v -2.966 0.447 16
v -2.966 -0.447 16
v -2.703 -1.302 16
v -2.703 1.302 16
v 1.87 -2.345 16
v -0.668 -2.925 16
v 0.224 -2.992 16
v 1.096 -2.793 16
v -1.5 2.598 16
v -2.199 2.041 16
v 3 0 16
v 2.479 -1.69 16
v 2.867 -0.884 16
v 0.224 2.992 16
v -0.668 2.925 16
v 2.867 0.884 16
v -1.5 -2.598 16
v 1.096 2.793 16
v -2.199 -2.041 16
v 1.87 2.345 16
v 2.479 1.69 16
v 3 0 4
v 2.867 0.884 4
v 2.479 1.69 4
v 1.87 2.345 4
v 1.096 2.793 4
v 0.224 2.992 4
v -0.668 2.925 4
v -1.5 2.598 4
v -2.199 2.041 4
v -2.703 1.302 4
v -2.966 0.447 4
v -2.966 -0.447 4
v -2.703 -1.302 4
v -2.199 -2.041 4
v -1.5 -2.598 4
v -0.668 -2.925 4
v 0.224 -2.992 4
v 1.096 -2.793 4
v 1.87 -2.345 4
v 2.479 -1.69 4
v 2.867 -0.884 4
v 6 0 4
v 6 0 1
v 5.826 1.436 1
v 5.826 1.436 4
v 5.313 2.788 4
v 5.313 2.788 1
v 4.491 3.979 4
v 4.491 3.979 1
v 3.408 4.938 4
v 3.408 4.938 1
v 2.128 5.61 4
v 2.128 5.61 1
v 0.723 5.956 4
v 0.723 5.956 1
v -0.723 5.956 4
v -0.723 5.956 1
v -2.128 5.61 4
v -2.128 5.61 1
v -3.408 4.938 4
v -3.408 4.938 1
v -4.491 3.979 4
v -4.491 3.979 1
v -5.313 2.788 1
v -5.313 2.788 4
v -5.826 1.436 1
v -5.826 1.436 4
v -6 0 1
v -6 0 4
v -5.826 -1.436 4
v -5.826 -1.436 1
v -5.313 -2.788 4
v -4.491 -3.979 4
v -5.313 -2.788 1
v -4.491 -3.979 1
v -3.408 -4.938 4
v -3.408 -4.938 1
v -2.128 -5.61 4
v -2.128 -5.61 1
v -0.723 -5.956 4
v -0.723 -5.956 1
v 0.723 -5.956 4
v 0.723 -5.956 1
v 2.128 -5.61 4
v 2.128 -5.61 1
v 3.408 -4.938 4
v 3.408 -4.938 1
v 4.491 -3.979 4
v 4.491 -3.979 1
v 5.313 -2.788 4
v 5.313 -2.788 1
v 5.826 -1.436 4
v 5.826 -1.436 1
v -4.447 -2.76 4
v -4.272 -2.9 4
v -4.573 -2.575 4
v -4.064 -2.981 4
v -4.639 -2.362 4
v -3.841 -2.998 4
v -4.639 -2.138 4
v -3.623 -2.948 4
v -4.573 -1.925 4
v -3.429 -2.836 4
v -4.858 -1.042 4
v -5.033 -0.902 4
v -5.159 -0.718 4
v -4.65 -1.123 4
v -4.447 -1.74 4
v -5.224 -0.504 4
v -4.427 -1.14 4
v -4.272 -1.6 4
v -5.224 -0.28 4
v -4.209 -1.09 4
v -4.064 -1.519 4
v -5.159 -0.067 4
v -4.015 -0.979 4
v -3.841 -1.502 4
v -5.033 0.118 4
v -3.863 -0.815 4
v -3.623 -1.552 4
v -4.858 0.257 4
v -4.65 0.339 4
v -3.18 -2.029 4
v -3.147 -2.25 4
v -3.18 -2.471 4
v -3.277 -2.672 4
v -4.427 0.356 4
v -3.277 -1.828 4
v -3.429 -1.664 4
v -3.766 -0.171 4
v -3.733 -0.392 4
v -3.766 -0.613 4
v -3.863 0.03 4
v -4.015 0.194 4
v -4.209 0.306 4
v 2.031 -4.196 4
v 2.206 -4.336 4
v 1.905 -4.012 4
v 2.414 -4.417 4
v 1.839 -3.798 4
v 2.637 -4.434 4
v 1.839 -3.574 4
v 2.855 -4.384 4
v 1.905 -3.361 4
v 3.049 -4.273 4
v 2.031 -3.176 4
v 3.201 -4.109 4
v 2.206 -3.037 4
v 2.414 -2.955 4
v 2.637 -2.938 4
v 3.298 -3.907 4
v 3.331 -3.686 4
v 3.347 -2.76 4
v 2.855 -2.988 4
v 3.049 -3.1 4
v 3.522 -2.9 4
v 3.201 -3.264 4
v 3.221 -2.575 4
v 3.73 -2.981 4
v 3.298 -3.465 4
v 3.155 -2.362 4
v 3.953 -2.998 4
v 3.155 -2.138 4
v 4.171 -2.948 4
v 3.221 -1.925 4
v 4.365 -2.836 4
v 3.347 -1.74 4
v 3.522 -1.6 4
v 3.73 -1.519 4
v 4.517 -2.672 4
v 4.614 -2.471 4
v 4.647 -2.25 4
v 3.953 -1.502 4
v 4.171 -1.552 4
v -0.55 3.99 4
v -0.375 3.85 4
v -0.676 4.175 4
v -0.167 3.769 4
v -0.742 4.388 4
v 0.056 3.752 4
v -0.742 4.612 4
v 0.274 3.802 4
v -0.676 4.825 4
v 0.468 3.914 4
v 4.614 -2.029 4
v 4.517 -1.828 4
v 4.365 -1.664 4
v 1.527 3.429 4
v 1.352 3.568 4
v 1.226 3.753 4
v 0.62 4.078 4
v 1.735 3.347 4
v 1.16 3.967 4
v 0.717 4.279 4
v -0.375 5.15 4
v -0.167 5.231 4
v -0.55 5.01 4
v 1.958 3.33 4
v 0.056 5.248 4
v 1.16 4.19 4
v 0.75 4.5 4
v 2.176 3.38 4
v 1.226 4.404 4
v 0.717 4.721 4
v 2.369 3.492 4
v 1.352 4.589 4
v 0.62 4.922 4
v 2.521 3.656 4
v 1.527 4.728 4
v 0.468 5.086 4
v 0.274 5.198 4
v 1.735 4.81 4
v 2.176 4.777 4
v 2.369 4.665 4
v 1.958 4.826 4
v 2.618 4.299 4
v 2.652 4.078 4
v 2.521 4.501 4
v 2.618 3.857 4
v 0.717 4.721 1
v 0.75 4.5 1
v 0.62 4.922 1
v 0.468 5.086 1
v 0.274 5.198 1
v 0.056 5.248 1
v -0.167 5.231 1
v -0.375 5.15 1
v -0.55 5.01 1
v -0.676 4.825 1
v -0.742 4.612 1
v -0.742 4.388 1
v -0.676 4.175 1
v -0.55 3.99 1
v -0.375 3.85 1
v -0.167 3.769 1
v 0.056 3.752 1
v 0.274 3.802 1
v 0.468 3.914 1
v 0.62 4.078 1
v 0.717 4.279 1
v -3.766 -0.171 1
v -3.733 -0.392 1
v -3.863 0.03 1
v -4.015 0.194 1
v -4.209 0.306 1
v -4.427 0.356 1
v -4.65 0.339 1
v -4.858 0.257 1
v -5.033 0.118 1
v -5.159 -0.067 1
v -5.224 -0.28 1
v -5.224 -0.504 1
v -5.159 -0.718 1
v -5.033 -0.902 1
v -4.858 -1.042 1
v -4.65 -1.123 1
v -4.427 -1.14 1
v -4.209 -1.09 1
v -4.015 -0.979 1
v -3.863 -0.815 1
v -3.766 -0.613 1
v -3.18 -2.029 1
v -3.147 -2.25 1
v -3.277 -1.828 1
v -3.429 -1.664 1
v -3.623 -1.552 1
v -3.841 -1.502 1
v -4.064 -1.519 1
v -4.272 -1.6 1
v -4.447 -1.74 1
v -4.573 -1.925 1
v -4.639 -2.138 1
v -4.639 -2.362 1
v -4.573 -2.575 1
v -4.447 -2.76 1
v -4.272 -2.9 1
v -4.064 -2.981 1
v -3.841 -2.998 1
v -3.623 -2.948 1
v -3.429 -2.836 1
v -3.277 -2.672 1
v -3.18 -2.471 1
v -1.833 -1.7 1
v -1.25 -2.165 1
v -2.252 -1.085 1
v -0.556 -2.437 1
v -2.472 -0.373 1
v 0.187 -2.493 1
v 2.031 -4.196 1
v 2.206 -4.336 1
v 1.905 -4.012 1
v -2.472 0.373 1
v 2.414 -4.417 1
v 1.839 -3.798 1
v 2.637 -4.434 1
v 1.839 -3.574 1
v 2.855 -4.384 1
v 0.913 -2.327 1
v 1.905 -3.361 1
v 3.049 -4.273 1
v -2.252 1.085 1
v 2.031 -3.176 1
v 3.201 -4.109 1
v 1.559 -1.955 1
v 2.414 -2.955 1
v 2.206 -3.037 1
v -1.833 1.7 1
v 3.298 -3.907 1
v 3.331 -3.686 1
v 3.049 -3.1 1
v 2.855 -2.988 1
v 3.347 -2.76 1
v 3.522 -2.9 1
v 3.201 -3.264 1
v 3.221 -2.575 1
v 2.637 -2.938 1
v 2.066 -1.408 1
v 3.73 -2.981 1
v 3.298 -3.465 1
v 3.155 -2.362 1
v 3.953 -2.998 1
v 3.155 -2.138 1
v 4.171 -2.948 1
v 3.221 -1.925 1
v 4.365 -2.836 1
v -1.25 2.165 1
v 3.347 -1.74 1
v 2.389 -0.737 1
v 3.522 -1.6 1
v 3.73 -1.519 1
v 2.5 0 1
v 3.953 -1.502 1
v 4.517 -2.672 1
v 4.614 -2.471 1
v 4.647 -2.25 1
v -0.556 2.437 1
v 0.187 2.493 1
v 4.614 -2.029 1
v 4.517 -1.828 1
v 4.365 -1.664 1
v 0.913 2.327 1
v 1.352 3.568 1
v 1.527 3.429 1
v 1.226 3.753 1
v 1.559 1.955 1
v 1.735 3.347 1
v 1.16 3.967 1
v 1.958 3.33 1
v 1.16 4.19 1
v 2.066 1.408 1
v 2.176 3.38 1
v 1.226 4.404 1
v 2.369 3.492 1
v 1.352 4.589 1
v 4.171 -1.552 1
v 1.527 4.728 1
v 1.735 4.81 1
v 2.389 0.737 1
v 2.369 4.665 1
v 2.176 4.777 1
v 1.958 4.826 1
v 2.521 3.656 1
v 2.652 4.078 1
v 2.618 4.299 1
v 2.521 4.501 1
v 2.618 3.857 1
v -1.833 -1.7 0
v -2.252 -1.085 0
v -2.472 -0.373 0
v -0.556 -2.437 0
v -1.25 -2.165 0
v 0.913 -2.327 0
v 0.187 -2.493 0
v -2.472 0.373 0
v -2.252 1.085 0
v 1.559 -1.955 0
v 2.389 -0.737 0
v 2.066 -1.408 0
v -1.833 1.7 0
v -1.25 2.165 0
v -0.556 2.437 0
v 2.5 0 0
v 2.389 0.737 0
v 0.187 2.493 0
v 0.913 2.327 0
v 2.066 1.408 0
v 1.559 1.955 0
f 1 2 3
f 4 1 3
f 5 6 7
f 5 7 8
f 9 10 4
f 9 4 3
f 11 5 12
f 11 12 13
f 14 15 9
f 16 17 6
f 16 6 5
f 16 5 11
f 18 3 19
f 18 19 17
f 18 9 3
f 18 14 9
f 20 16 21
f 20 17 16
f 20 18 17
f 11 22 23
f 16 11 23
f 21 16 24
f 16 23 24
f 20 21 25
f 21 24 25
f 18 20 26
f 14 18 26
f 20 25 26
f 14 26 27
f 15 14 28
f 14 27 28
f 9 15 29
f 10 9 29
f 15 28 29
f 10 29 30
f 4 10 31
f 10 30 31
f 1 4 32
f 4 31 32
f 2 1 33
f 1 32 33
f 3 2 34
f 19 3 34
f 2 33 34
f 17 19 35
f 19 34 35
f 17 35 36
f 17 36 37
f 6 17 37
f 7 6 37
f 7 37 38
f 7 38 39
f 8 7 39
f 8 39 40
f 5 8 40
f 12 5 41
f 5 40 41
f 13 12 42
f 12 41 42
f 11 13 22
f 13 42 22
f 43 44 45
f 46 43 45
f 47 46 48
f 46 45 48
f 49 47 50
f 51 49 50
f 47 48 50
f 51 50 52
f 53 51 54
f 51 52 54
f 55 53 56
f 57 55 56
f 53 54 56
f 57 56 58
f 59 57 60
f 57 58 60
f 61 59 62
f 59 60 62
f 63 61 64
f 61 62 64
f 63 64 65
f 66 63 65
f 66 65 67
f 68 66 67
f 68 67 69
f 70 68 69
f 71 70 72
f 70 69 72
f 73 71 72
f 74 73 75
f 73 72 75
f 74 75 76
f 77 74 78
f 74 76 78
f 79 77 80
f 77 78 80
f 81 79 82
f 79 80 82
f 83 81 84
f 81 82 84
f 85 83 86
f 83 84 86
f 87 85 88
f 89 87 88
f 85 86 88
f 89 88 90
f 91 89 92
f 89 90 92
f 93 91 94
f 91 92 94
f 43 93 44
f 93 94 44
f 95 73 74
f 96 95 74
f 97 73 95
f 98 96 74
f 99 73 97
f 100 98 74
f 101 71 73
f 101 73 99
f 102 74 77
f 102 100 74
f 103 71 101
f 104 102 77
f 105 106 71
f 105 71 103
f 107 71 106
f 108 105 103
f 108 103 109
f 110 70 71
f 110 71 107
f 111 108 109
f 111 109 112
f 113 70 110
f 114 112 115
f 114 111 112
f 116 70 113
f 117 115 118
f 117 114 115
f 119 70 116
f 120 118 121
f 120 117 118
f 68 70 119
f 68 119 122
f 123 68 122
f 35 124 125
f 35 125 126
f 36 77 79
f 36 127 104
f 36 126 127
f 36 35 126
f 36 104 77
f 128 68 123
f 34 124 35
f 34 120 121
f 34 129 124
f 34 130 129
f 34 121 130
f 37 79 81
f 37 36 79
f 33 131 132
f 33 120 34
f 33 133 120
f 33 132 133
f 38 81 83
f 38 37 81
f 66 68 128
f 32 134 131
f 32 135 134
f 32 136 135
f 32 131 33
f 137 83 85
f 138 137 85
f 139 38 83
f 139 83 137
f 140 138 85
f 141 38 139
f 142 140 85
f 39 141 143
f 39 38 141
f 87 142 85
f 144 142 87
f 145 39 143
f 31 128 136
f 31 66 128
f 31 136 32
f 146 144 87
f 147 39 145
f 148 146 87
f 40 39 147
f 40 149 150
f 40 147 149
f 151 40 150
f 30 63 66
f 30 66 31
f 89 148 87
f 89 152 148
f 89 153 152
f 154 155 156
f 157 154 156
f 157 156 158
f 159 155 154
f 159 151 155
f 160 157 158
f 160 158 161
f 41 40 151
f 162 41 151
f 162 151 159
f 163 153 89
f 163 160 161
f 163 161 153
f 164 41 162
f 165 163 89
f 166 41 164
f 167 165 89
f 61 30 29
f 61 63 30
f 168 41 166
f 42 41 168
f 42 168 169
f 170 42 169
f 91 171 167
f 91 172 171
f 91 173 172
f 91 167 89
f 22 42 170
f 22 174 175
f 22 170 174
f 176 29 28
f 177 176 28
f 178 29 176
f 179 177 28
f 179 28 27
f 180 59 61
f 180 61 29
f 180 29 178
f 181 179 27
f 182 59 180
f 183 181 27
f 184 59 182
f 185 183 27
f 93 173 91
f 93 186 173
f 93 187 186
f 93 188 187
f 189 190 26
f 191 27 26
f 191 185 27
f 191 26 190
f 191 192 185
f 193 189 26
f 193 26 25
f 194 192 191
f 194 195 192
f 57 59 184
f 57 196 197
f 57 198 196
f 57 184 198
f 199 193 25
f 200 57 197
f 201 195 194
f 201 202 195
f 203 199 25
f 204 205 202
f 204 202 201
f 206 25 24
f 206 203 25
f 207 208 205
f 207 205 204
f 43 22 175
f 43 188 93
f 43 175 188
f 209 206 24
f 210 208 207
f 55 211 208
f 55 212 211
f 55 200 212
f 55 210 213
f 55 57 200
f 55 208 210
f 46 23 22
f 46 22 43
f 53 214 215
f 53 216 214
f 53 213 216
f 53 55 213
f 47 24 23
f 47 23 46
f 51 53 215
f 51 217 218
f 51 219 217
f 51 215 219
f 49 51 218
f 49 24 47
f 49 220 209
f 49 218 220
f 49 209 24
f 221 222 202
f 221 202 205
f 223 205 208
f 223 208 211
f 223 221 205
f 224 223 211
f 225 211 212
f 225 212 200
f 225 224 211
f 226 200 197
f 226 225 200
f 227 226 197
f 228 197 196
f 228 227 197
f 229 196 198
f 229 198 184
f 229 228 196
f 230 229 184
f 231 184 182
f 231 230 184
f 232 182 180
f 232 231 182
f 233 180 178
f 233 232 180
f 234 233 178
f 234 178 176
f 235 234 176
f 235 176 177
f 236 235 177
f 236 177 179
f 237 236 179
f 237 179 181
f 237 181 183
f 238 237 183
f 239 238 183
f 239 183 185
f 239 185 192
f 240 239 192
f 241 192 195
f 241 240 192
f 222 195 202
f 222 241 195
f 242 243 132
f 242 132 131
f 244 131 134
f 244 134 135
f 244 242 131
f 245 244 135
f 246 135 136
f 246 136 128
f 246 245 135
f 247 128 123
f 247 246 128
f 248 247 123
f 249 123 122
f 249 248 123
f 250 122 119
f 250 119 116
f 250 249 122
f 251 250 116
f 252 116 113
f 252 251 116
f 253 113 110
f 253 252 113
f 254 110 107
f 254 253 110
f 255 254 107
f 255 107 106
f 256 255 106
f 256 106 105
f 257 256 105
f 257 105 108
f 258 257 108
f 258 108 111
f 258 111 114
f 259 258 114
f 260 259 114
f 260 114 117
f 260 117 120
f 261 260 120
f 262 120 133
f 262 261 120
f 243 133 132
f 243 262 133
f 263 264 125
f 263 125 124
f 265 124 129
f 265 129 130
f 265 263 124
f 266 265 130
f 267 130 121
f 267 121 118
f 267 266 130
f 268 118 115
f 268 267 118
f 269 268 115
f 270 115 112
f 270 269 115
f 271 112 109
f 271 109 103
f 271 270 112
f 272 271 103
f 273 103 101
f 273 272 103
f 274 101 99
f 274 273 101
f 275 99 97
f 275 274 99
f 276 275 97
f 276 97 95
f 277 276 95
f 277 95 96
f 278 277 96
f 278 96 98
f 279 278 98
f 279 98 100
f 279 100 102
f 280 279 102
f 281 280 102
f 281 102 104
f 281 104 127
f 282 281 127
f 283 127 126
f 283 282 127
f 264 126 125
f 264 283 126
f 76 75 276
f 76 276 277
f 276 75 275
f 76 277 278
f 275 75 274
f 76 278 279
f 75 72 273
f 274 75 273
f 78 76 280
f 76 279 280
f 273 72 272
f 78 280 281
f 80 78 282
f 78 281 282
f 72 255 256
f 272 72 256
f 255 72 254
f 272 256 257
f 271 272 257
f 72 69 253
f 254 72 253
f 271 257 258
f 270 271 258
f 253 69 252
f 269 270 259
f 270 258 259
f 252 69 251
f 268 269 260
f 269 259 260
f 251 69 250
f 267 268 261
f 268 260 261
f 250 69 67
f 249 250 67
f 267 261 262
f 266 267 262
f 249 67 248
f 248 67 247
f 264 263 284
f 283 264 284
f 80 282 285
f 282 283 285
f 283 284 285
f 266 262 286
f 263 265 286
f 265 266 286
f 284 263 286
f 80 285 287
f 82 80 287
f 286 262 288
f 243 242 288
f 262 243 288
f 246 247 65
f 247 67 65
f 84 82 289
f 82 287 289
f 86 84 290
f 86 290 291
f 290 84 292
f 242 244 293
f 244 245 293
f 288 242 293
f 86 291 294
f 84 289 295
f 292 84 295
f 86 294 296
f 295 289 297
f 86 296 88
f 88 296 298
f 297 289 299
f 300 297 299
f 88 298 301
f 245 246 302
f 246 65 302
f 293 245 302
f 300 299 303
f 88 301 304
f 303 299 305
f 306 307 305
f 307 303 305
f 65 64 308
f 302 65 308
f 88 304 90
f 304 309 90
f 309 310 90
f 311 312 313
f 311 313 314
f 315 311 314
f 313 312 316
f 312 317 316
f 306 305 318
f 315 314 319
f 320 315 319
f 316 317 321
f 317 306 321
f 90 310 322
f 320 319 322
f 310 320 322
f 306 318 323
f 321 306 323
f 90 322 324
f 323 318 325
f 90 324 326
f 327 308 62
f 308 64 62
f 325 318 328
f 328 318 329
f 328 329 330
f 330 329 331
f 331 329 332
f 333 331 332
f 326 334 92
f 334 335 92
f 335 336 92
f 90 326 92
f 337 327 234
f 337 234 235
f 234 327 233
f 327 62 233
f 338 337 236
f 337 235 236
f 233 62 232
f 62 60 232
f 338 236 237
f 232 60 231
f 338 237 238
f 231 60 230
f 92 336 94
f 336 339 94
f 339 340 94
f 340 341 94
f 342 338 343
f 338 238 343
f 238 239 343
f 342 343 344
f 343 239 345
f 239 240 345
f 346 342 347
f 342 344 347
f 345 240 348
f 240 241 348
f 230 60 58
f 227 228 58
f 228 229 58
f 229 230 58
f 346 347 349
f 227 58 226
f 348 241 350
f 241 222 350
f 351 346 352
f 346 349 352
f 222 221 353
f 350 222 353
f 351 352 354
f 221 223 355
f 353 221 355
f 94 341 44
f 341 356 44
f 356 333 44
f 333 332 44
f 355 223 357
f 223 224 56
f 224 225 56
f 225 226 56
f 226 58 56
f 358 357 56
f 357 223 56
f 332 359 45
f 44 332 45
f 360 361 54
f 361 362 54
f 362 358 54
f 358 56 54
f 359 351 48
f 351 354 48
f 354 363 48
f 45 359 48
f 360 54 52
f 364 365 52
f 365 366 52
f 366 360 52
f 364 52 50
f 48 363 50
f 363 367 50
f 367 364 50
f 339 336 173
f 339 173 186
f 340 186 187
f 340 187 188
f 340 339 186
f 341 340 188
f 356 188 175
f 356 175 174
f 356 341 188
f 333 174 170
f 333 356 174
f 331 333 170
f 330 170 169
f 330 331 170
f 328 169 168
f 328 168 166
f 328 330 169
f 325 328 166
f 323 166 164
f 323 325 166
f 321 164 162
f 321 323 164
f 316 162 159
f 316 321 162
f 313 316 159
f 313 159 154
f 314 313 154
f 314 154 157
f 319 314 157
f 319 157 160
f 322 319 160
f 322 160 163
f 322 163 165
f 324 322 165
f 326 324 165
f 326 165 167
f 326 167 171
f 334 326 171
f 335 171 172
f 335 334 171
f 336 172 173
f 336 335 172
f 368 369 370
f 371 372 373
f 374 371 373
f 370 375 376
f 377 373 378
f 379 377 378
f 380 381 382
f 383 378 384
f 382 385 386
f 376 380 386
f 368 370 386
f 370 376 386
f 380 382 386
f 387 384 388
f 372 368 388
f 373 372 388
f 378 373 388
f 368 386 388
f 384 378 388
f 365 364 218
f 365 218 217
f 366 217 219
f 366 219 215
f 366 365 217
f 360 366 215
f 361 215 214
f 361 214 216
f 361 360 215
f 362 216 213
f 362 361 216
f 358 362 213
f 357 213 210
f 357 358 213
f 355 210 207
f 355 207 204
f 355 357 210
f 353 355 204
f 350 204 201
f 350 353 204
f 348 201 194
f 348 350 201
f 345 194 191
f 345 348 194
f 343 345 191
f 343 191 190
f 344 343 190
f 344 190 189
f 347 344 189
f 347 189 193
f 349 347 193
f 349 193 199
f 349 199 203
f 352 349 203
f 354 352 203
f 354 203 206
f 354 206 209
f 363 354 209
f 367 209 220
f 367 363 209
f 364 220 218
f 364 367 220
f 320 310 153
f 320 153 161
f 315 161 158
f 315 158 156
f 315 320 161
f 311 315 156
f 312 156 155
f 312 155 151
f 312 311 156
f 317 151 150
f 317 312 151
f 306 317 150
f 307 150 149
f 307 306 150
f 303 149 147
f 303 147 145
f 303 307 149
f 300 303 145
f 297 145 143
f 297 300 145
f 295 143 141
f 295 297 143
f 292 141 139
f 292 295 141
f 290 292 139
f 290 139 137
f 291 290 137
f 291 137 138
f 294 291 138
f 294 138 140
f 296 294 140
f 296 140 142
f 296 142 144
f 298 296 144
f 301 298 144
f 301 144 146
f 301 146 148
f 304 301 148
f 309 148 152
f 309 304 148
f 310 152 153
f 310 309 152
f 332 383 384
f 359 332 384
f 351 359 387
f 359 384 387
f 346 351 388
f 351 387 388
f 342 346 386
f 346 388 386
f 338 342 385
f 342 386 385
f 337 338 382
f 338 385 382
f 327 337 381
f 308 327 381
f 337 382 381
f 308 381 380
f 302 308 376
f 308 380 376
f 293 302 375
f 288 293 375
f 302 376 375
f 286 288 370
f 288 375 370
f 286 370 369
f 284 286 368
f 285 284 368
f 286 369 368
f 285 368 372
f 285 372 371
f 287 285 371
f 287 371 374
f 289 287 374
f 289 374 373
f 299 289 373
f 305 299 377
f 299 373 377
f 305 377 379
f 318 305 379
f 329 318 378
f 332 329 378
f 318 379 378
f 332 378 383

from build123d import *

# Parameters (mm, degrees)
SKETCH_1_R      = 2.5
EXTRUDE_1_DEPTH = 1
SKETCH_2_R      = 6
SKETCH_2_R_2    = 0.75
EXTRUDE_2_DEPTH = 3
SKETCH_3_R      = 3
EXTRUDE_3_DEPTH = 12


with BuildPart() as part:
    # 草图1 → 凸台-拉伸1 (new body)
    with BuildSketch(Plane.XY):
        Circle(SKETCH_1_R)
    extrude(amount=EXTRUDE_1_DEPTH)

    # 草图2 → 凸台-拉伸2 (add)
    with BuildSketch(Plane.XY.offset(1)):
        Circle(SKETCH_2_R)
        with Locations((0, 4.5)):
            Circle(SKETCH_2_R_2, mode=Mode.SUBTRACT)
        with Locations((1.901782178, 4.078385042)):
            Circle(SKETCH_2_R_2, mode=Mode.SUBTRACT)
        with Locations((3.897114317, -2.25)):
            Circle(SKETCH_2_R_2, mode=Mode.SUBTRACT)
        with Locations((2.581093964, -3.686184199)):
            Circle(SKETCH_2_R_2, mode=Mode.SUBTRACT)
        with Locations((-3.897114317, -2.25)):
            Circle(SKETCH_2_R_2, mode=Mode.SUBTRACT)
        with Locations((-4.482876141, -0.392200842)):
            Circle(SKETCH_2_R_2, mode=Mode.SUBTRACT)
    extrude(amount=EXTRUDE_2_DEPTH)

    # 草图3 → 凸台-拉伸3 (add)
    with BuildSketch(Plane.XY.offset(4)):
        Circle(SKETCH_3_R)
    extrude(amount=EXTRUDE_3_DEPTH)


solid = part.part
